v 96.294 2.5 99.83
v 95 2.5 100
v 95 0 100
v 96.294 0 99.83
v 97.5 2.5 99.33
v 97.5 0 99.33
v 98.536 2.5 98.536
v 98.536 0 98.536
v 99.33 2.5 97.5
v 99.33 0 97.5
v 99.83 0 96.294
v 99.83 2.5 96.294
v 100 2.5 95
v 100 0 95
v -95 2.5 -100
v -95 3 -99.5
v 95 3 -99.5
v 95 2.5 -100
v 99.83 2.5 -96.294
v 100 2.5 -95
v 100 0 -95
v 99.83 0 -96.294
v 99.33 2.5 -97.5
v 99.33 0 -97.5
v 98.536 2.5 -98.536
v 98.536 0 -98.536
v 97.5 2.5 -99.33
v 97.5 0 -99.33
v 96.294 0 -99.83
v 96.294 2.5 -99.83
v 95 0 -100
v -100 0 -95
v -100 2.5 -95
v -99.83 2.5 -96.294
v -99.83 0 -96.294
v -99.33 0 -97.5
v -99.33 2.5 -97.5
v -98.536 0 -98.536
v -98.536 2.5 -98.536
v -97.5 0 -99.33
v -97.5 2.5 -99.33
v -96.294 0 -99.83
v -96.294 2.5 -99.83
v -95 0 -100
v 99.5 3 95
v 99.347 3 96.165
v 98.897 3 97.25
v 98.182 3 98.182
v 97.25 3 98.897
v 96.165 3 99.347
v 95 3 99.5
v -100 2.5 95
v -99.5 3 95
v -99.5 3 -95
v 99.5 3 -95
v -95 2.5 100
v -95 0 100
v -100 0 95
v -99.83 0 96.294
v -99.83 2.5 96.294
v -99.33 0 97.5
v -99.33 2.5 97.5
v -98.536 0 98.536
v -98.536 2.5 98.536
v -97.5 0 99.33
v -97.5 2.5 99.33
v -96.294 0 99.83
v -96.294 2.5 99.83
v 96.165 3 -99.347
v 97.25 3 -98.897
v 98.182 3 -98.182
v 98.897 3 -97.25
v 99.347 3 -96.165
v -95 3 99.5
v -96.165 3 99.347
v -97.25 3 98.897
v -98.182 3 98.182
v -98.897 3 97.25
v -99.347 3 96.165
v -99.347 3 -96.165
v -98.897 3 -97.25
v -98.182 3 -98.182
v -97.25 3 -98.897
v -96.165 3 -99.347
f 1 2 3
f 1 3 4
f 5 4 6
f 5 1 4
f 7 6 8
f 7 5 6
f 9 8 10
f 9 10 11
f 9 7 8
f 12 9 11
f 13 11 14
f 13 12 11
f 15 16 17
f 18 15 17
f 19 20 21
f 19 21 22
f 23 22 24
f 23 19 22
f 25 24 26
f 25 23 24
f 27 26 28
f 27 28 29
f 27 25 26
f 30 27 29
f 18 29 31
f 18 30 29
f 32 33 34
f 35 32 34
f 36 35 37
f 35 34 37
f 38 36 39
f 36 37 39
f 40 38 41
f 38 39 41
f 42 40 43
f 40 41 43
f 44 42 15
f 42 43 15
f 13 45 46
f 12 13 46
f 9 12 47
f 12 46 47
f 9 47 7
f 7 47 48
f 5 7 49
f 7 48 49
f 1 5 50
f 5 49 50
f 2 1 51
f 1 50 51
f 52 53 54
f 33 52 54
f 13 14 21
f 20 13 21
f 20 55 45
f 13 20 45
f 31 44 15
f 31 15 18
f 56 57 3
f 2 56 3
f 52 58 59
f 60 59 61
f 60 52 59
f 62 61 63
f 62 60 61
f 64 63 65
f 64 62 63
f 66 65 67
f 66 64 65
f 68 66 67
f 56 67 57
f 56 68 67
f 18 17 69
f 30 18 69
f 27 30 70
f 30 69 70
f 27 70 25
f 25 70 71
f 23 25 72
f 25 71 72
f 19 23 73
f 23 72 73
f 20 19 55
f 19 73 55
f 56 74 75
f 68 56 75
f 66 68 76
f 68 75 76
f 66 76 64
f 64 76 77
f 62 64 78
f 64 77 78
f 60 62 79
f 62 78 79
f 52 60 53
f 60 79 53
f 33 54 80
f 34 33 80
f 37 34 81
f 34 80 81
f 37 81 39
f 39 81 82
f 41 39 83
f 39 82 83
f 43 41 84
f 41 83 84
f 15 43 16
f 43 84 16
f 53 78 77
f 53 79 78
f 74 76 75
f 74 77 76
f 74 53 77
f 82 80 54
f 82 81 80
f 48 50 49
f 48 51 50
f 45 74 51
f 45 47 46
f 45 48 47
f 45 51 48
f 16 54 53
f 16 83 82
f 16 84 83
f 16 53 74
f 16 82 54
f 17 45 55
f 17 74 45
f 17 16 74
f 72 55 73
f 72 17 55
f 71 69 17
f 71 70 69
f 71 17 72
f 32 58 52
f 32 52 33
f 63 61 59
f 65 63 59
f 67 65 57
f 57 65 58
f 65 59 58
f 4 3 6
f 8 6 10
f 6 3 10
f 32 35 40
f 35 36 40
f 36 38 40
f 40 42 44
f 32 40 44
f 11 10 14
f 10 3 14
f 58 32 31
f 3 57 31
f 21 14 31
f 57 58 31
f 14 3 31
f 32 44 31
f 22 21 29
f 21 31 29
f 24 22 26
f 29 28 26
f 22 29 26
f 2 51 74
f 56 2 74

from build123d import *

# Parameters (mm, degrees)
CROQUIS1_W              = 200
CROQUIS1_H              = 200
SALIENTE_EXTRUIR1_DEPTH = 3
REDONDEO1_R             = 5
CHAFL_N1_SIZE           = 0.5


with BuildPart() as part:
    # Croquis1 → Saliente-Extruir1 (new body)
    with BuildSketch(Plane(origin=(0, 0, 0), x_dir=(1, 0, 0), z_dir=(0, 1, 0))):
        Rectangle(CROQUIS1_W, CROQUIS1_H)
    extrude(amount=SALIENTE_EXTRUIR1_DEPTH)

    # Redondeo1
    redondeo1_edges = [part.edges().sort_by_distance(p)[0] for p in [
        (100, 1.5, 100),
        (-100, 1.5, 100),
        (-100, 1.5, -100),
        (100, 1.5, -100),
    ]]
    fillet(redondeo1_edges, radius=REDONDEO1_R)

    # Chaflán1
    chafl_n1_edges = [part.edges().sort_by_distance(p)[0] for p in [
        (-100, 3, 0),
        (0, 3, -100),
        (100, 3, 0),
        (0, 3, 100),
        (-98.535533906, 3, 98.535533906),
        (98.535533906, 3, 98.535533906),
        (98.535533906, 3, -98.535533906),
        (-98.535533906, 3, -98.535533906),
    ]]
    chamfer(chafl_n1_edges, length=CHAFL_N1_SIZE)


solid = part.part
